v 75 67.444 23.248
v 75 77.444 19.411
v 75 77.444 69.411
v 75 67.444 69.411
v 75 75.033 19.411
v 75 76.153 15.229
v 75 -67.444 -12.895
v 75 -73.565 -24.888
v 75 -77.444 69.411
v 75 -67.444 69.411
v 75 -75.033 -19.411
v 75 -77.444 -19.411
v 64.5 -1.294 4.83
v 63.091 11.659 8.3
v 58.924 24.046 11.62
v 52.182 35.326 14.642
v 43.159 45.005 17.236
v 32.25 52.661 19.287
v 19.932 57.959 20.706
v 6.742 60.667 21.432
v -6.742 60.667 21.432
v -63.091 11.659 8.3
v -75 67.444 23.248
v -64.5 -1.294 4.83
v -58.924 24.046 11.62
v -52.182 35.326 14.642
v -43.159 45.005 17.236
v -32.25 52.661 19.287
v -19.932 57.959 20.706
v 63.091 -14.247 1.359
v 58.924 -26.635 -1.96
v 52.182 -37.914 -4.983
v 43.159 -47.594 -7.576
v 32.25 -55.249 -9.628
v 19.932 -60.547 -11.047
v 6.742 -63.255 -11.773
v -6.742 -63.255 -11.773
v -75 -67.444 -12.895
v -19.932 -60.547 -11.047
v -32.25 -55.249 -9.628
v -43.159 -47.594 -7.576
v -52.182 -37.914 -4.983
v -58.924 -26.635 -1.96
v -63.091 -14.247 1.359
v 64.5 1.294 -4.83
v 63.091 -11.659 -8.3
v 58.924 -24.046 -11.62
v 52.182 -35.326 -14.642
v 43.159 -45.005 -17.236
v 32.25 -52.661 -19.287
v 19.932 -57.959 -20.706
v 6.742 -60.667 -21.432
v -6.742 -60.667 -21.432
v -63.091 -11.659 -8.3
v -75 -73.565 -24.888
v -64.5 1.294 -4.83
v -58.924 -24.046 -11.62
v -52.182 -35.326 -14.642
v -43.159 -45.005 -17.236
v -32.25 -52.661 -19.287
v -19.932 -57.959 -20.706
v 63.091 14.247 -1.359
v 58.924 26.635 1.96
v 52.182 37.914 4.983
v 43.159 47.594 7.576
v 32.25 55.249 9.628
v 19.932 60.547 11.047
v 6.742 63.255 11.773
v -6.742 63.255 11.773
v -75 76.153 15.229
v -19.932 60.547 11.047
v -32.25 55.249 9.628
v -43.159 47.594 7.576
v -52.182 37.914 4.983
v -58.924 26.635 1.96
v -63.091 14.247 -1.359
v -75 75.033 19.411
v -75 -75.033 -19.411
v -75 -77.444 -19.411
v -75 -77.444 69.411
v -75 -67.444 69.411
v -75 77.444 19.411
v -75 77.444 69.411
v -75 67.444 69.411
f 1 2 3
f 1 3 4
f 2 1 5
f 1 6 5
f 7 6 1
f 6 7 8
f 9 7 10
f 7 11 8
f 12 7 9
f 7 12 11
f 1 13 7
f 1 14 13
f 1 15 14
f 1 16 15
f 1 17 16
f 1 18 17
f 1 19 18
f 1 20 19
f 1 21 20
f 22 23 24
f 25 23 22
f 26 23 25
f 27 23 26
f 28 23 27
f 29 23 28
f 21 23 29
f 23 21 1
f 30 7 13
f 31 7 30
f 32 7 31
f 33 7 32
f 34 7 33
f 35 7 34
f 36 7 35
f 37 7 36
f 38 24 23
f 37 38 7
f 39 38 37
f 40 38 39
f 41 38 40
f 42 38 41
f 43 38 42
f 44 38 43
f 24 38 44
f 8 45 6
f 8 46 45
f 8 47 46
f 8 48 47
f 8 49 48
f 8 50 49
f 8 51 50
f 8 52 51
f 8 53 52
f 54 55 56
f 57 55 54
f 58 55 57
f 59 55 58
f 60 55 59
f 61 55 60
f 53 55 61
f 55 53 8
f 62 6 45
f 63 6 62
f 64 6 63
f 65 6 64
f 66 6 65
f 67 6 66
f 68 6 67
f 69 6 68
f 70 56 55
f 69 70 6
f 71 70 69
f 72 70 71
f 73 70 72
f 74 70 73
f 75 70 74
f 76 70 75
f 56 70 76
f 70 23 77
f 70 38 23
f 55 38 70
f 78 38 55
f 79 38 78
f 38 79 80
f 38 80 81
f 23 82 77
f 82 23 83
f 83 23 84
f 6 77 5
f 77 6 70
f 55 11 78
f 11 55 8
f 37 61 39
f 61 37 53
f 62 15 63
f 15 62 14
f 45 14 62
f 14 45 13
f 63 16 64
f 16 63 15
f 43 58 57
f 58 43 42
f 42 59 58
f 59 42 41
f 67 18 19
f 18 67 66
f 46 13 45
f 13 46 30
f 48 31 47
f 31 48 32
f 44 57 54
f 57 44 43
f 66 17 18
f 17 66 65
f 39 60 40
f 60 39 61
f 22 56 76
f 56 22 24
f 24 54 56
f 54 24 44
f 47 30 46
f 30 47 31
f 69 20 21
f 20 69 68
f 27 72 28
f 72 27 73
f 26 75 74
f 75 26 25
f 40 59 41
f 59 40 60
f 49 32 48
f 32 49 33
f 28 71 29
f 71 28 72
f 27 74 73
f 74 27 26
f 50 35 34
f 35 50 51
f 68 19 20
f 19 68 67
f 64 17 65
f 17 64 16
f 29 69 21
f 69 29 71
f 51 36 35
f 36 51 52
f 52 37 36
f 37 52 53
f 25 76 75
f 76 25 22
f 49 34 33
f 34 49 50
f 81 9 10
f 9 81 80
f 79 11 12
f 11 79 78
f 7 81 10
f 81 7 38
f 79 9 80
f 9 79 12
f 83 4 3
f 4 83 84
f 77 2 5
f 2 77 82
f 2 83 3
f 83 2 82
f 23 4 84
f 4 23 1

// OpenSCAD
// radius of the bowl, may need to add ~1mm to fit nicely
cat_bowl_r = 64.5;

// Width and height of the faceplate
frame_size = 150;

// Thickness of the faceplate and legs
frame_thickness = 10;

// Angle of the faceplate to the ground
frame_angle = 15;

// Height of the front leg
frame_height = 50;

rotate([frame_angle,0,0]) difference() {
    cube([frame_size,frame_size+frame_thickness/2,frame_thickness], true);
    cylinder(frame_thickness+1, cat_bowl_r, cat_bowl_r, true);
}

translate([0,-cos(frame_angle)*frame_size/2,frame_height/2])
    cube([frame_size,frame_thickness,sin(frame_angle)*frame_size+frame_height], true);

translate([0,cos(frame_angle)*frame_size/2,sin(frame_angle)*frame_size/2+frame_height/2])
    cube([frame_size,frame_thickness,frame_height], true);
